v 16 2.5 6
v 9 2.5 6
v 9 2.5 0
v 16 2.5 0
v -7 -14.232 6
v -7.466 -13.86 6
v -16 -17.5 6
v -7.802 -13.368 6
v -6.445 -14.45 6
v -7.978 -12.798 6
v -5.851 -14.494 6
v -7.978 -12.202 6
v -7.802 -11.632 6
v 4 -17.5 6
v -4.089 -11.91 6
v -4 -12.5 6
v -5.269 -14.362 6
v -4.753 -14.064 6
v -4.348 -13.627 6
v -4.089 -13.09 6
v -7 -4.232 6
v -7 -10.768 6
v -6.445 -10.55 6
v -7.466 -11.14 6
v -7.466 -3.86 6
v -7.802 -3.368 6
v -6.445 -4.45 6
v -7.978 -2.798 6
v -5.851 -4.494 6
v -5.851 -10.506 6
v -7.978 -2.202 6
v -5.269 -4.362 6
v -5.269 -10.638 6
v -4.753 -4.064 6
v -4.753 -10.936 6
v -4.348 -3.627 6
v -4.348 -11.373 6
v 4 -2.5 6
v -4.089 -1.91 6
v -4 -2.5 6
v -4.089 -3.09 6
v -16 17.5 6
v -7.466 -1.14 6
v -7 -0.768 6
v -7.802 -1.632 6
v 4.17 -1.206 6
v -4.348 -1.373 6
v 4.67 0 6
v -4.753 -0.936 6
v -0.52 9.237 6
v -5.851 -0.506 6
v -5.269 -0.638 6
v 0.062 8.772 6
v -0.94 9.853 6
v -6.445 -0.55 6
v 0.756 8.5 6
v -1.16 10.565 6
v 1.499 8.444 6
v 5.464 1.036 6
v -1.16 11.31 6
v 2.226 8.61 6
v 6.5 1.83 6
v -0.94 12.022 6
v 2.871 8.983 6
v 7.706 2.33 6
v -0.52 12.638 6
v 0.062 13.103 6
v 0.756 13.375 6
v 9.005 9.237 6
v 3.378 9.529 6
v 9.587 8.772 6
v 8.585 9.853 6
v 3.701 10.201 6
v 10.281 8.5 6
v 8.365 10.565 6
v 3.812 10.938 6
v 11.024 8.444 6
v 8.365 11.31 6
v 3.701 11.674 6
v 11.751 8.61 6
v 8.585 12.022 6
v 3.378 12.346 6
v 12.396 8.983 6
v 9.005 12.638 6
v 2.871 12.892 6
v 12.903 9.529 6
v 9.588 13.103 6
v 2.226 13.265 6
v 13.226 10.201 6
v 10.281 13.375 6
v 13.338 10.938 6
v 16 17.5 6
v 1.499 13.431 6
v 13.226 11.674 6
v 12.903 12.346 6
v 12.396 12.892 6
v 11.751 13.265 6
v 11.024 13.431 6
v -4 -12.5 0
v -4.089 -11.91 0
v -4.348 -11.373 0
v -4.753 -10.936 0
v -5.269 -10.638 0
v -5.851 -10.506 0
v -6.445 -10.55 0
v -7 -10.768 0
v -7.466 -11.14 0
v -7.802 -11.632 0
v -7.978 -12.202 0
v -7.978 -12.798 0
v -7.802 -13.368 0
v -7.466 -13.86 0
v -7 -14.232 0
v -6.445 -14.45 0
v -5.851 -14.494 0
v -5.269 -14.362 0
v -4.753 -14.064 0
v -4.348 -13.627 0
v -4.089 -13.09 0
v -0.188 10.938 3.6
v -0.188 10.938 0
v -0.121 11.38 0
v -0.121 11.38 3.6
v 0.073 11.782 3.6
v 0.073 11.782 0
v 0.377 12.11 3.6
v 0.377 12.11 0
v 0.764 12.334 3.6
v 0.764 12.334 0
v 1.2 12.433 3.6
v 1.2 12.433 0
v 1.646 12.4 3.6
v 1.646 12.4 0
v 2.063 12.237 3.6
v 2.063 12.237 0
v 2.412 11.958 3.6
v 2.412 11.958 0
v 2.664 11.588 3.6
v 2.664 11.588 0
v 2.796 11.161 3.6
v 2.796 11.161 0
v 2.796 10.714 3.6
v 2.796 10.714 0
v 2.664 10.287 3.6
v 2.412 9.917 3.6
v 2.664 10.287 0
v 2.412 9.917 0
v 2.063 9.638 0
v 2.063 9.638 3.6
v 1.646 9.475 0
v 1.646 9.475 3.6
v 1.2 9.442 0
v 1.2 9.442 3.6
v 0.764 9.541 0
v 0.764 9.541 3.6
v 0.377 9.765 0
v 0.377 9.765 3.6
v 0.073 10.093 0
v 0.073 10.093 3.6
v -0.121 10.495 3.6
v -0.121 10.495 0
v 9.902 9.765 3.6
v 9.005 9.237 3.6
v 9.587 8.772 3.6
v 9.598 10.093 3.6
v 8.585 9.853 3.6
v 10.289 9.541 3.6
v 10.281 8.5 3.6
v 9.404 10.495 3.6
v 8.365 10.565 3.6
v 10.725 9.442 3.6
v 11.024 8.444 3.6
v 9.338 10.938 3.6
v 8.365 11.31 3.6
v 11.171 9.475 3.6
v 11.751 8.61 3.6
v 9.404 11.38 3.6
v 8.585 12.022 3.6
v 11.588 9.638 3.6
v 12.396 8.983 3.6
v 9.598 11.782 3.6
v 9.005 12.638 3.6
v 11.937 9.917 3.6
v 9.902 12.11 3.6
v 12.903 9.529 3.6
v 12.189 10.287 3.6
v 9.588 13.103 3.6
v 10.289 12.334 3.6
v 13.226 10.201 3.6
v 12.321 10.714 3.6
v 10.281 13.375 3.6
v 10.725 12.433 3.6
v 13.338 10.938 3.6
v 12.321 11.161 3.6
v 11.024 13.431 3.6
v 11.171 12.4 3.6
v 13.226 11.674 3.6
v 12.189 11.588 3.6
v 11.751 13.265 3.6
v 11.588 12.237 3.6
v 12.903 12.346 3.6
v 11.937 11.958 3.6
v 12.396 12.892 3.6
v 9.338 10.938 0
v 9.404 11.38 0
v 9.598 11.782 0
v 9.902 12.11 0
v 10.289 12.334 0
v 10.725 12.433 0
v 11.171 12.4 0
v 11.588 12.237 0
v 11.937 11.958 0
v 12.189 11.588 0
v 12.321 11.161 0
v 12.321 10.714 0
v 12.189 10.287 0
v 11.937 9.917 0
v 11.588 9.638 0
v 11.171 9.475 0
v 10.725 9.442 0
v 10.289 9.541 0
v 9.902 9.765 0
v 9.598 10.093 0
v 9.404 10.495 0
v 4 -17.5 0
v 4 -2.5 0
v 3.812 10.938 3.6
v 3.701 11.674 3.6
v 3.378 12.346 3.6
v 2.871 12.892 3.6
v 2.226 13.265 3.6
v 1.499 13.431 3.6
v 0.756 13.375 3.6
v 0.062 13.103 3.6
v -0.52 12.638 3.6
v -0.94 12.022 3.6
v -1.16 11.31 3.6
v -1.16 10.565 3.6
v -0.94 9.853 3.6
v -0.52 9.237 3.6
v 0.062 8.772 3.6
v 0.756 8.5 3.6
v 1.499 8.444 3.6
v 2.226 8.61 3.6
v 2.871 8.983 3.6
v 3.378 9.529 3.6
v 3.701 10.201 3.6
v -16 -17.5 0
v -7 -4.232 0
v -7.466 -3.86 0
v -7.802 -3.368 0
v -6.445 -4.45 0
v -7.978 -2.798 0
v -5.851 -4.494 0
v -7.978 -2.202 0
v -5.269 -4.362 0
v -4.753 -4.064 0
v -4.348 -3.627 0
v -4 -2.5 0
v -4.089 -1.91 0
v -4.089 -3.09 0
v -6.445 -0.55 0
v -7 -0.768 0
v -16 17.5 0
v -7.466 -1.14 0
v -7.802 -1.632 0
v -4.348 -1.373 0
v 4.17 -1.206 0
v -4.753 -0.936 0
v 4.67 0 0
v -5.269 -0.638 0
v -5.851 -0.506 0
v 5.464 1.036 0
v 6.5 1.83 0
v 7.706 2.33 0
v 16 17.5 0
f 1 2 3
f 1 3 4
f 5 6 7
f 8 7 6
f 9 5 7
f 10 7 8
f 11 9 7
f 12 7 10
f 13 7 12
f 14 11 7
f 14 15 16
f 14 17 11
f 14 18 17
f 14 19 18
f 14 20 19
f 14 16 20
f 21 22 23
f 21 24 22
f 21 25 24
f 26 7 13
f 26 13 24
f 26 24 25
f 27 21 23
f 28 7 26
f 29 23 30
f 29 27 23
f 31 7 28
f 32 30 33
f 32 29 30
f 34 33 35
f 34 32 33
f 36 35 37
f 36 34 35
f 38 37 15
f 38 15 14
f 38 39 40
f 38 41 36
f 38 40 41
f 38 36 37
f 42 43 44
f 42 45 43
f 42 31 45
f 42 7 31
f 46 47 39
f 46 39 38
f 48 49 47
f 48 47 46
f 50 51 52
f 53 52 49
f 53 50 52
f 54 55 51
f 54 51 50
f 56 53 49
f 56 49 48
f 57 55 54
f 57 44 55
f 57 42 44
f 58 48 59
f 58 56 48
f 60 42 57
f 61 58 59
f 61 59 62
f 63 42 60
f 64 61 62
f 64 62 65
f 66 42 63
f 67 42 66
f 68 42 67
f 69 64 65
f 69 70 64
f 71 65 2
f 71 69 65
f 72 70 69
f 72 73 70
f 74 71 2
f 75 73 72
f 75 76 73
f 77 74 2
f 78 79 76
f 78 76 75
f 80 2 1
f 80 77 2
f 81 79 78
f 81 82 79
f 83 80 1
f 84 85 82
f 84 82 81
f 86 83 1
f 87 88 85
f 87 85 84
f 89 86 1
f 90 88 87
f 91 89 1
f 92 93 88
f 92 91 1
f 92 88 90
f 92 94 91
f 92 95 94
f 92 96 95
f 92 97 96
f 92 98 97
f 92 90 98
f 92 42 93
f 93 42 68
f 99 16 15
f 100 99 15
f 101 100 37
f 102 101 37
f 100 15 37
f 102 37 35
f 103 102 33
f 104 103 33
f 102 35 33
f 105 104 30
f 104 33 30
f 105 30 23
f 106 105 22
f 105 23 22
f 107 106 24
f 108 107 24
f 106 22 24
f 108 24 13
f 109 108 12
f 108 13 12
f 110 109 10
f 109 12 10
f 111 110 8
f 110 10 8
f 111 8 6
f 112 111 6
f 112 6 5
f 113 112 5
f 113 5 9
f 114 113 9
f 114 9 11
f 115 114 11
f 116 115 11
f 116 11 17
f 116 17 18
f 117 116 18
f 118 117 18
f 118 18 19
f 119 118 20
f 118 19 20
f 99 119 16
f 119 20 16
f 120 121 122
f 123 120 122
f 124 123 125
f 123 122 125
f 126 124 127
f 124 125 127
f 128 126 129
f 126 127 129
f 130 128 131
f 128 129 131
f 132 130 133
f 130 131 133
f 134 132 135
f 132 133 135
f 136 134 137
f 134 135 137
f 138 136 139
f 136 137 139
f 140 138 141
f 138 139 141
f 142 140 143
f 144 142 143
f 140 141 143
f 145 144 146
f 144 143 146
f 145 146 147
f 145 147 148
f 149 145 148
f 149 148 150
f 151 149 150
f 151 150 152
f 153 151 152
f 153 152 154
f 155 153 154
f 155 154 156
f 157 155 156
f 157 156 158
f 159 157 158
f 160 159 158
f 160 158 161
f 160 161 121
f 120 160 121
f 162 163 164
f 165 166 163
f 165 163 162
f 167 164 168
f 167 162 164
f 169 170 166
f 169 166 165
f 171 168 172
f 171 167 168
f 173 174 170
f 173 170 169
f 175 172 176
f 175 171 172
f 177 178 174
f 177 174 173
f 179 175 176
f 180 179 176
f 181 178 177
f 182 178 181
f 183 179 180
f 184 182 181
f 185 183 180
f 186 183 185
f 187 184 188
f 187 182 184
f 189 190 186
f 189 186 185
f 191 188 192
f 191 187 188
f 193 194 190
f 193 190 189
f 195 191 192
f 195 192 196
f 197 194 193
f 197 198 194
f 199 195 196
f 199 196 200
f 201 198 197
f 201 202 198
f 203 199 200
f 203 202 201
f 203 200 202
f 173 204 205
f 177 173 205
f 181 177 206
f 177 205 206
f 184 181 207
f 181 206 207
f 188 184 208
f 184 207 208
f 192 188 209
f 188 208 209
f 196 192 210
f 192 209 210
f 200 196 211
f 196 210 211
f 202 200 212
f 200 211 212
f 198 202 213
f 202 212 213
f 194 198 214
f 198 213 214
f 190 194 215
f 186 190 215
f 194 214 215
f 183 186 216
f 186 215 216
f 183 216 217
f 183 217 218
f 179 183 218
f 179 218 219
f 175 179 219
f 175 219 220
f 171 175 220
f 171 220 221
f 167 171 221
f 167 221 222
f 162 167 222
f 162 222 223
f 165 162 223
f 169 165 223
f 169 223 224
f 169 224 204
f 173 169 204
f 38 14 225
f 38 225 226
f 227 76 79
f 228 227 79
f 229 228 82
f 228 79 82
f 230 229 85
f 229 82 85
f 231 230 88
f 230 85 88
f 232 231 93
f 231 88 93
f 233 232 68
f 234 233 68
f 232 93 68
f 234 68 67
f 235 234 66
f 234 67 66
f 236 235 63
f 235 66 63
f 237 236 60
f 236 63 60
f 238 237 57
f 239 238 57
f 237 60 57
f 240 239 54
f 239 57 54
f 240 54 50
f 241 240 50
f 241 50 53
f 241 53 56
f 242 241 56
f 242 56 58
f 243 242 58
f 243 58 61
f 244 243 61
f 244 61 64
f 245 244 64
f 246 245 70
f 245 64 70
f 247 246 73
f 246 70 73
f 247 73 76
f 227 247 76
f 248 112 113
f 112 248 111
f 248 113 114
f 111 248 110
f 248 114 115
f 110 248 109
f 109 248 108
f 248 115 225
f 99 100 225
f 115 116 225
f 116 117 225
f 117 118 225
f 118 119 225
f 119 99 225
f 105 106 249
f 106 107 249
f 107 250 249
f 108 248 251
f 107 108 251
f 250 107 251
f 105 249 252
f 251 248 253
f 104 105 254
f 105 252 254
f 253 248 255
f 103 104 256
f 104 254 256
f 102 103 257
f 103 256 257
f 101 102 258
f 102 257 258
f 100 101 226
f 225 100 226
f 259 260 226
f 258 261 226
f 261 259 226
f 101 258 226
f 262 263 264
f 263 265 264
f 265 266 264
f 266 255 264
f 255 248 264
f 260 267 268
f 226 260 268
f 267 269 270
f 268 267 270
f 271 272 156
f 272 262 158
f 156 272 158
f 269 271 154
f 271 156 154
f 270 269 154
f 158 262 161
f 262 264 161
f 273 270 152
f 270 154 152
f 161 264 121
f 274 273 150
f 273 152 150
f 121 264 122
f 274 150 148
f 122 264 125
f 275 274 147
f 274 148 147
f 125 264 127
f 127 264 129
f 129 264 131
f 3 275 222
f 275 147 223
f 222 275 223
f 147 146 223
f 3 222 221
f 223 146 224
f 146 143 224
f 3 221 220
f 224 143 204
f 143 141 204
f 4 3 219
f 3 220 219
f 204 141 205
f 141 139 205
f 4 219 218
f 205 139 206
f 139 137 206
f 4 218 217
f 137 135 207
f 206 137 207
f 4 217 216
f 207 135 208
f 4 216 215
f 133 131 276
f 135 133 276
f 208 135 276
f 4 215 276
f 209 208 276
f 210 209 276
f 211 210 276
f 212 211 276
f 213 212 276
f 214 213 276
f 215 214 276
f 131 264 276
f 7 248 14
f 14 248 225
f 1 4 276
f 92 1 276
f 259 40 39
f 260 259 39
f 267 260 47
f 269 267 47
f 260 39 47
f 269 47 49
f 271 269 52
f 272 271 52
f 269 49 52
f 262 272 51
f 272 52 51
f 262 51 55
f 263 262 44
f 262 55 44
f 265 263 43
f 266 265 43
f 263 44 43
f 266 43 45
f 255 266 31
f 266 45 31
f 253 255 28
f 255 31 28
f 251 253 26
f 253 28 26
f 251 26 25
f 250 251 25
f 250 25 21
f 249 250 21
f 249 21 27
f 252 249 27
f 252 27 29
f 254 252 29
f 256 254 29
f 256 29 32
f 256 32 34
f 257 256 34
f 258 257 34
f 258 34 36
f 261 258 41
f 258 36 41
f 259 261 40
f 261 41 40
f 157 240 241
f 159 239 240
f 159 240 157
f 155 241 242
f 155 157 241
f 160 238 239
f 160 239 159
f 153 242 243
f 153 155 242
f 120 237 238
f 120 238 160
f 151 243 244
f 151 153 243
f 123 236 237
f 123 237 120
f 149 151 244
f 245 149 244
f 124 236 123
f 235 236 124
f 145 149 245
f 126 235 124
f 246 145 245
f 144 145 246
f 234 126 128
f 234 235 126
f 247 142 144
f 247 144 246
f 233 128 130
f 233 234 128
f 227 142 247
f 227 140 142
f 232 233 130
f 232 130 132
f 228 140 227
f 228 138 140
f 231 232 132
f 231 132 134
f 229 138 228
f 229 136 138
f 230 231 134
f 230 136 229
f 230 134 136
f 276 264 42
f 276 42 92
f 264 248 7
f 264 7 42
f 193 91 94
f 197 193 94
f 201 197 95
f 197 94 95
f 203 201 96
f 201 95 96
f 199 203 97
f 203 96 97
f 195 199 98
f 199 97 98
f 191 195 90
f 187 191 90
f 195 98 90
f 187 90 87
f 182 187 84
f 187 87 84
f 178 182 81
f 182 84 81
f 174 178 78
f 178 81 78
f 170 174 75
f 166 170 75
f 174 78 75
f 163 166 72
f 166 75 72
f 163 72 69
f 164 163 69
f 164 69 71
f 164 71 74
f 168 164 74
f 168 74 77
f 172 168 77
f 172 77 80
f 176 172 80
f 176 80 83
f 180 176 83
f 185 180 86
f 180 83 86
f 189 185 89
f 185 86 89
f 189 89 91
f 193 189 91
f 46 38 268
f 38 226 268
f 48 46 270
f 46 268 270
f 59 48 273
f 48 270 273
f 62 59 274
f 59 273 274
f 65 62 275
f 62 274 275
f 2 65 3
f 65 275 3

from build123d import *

# Parameters (mm, degrees)
ESBO_O1_W                = 32
ESBO_O1_H                = 35
RESSALTO_EXTRUS_O1_DEPTH = 6
ESBO_O2_R                = 2
ESBO_O2_W                = 12
ESBO_O2_H                = 20
CORTE_EXTRUS_O1_DEPTH    = 6
FILETE1_R                = 5
ESBO_O5_R                = 1.5
CORTE_EXTRUS_O3_DEPTH    = 6
ESBO_O6_R                = 2.5
CORTE_EXTRUS_O4_DEPTH    = 2.4


with BuildPart() as part:
    # Esboço1 → Ressalto-extrusão1 (new body)
    with BuildSketch(Plane.XY):
        Rectangle(ESBO_O1_W, ESBO_O1_H)
    extrude(amount=RESSALTO_EXTRUS_O1_DEPTH)

    # Esboço2 → Corte-extrusão1 (cut)
    with BuildSketch(Plane.XY.offset(6)):
        with Locations((-6, -12.5)):
            Circle(ESBO_O2_R)
        with Locations((-6, -2.5)):
            Circle(ESBO_O2_R)
        with Locations((10, -7.5)):
            Rectangle(ESBO_O2_W, ESBO_O2_H)
    extrude(amount=-CORTE_EXTRUS_O1_DEPTH, mode=Mode.SUBTRACT)

    # Filete1
    filete1_edges = [part.edges().sort_by_distance(p)[0] for p in [
        (4, 2.5, 3),
    ]]
    fillet(filete1_edges, radius=FILETE1_R)

    # Esboço5 → Corte-extrusão3 (cut)
    with BuildSketch(Plane(origin=(0, 0, 0), x_dir=(-1, 0, 0), z_dir=(0, 0, -1))):
        with Locations((-10.8375, 10.9375)):
            Circle(ESBO_O5_R)
        with Locations((-1.3125, 10.9375)):
            Circle(ESBO_O5_R)
    extrude(amount=-CORTE_EXTRUS_O3_DEPTH, mode=Mode.SUBTRACT)

    # Esboço6 → Corte-extrusão4 (cut)
    with BuildSketch(Plane.XY.offset(6)):
        with Locations((10.8375, 10.9375)):
            Circle(ESBO_O6_R)
        with Locations((1.3125, 10.9375)):
            Circle(ESBO_O6_R)
    extrude(amount=-CORTE_EXTRUS_O4_DEPTH, mode=Mode.SUBTRACT)


solid = part.part
